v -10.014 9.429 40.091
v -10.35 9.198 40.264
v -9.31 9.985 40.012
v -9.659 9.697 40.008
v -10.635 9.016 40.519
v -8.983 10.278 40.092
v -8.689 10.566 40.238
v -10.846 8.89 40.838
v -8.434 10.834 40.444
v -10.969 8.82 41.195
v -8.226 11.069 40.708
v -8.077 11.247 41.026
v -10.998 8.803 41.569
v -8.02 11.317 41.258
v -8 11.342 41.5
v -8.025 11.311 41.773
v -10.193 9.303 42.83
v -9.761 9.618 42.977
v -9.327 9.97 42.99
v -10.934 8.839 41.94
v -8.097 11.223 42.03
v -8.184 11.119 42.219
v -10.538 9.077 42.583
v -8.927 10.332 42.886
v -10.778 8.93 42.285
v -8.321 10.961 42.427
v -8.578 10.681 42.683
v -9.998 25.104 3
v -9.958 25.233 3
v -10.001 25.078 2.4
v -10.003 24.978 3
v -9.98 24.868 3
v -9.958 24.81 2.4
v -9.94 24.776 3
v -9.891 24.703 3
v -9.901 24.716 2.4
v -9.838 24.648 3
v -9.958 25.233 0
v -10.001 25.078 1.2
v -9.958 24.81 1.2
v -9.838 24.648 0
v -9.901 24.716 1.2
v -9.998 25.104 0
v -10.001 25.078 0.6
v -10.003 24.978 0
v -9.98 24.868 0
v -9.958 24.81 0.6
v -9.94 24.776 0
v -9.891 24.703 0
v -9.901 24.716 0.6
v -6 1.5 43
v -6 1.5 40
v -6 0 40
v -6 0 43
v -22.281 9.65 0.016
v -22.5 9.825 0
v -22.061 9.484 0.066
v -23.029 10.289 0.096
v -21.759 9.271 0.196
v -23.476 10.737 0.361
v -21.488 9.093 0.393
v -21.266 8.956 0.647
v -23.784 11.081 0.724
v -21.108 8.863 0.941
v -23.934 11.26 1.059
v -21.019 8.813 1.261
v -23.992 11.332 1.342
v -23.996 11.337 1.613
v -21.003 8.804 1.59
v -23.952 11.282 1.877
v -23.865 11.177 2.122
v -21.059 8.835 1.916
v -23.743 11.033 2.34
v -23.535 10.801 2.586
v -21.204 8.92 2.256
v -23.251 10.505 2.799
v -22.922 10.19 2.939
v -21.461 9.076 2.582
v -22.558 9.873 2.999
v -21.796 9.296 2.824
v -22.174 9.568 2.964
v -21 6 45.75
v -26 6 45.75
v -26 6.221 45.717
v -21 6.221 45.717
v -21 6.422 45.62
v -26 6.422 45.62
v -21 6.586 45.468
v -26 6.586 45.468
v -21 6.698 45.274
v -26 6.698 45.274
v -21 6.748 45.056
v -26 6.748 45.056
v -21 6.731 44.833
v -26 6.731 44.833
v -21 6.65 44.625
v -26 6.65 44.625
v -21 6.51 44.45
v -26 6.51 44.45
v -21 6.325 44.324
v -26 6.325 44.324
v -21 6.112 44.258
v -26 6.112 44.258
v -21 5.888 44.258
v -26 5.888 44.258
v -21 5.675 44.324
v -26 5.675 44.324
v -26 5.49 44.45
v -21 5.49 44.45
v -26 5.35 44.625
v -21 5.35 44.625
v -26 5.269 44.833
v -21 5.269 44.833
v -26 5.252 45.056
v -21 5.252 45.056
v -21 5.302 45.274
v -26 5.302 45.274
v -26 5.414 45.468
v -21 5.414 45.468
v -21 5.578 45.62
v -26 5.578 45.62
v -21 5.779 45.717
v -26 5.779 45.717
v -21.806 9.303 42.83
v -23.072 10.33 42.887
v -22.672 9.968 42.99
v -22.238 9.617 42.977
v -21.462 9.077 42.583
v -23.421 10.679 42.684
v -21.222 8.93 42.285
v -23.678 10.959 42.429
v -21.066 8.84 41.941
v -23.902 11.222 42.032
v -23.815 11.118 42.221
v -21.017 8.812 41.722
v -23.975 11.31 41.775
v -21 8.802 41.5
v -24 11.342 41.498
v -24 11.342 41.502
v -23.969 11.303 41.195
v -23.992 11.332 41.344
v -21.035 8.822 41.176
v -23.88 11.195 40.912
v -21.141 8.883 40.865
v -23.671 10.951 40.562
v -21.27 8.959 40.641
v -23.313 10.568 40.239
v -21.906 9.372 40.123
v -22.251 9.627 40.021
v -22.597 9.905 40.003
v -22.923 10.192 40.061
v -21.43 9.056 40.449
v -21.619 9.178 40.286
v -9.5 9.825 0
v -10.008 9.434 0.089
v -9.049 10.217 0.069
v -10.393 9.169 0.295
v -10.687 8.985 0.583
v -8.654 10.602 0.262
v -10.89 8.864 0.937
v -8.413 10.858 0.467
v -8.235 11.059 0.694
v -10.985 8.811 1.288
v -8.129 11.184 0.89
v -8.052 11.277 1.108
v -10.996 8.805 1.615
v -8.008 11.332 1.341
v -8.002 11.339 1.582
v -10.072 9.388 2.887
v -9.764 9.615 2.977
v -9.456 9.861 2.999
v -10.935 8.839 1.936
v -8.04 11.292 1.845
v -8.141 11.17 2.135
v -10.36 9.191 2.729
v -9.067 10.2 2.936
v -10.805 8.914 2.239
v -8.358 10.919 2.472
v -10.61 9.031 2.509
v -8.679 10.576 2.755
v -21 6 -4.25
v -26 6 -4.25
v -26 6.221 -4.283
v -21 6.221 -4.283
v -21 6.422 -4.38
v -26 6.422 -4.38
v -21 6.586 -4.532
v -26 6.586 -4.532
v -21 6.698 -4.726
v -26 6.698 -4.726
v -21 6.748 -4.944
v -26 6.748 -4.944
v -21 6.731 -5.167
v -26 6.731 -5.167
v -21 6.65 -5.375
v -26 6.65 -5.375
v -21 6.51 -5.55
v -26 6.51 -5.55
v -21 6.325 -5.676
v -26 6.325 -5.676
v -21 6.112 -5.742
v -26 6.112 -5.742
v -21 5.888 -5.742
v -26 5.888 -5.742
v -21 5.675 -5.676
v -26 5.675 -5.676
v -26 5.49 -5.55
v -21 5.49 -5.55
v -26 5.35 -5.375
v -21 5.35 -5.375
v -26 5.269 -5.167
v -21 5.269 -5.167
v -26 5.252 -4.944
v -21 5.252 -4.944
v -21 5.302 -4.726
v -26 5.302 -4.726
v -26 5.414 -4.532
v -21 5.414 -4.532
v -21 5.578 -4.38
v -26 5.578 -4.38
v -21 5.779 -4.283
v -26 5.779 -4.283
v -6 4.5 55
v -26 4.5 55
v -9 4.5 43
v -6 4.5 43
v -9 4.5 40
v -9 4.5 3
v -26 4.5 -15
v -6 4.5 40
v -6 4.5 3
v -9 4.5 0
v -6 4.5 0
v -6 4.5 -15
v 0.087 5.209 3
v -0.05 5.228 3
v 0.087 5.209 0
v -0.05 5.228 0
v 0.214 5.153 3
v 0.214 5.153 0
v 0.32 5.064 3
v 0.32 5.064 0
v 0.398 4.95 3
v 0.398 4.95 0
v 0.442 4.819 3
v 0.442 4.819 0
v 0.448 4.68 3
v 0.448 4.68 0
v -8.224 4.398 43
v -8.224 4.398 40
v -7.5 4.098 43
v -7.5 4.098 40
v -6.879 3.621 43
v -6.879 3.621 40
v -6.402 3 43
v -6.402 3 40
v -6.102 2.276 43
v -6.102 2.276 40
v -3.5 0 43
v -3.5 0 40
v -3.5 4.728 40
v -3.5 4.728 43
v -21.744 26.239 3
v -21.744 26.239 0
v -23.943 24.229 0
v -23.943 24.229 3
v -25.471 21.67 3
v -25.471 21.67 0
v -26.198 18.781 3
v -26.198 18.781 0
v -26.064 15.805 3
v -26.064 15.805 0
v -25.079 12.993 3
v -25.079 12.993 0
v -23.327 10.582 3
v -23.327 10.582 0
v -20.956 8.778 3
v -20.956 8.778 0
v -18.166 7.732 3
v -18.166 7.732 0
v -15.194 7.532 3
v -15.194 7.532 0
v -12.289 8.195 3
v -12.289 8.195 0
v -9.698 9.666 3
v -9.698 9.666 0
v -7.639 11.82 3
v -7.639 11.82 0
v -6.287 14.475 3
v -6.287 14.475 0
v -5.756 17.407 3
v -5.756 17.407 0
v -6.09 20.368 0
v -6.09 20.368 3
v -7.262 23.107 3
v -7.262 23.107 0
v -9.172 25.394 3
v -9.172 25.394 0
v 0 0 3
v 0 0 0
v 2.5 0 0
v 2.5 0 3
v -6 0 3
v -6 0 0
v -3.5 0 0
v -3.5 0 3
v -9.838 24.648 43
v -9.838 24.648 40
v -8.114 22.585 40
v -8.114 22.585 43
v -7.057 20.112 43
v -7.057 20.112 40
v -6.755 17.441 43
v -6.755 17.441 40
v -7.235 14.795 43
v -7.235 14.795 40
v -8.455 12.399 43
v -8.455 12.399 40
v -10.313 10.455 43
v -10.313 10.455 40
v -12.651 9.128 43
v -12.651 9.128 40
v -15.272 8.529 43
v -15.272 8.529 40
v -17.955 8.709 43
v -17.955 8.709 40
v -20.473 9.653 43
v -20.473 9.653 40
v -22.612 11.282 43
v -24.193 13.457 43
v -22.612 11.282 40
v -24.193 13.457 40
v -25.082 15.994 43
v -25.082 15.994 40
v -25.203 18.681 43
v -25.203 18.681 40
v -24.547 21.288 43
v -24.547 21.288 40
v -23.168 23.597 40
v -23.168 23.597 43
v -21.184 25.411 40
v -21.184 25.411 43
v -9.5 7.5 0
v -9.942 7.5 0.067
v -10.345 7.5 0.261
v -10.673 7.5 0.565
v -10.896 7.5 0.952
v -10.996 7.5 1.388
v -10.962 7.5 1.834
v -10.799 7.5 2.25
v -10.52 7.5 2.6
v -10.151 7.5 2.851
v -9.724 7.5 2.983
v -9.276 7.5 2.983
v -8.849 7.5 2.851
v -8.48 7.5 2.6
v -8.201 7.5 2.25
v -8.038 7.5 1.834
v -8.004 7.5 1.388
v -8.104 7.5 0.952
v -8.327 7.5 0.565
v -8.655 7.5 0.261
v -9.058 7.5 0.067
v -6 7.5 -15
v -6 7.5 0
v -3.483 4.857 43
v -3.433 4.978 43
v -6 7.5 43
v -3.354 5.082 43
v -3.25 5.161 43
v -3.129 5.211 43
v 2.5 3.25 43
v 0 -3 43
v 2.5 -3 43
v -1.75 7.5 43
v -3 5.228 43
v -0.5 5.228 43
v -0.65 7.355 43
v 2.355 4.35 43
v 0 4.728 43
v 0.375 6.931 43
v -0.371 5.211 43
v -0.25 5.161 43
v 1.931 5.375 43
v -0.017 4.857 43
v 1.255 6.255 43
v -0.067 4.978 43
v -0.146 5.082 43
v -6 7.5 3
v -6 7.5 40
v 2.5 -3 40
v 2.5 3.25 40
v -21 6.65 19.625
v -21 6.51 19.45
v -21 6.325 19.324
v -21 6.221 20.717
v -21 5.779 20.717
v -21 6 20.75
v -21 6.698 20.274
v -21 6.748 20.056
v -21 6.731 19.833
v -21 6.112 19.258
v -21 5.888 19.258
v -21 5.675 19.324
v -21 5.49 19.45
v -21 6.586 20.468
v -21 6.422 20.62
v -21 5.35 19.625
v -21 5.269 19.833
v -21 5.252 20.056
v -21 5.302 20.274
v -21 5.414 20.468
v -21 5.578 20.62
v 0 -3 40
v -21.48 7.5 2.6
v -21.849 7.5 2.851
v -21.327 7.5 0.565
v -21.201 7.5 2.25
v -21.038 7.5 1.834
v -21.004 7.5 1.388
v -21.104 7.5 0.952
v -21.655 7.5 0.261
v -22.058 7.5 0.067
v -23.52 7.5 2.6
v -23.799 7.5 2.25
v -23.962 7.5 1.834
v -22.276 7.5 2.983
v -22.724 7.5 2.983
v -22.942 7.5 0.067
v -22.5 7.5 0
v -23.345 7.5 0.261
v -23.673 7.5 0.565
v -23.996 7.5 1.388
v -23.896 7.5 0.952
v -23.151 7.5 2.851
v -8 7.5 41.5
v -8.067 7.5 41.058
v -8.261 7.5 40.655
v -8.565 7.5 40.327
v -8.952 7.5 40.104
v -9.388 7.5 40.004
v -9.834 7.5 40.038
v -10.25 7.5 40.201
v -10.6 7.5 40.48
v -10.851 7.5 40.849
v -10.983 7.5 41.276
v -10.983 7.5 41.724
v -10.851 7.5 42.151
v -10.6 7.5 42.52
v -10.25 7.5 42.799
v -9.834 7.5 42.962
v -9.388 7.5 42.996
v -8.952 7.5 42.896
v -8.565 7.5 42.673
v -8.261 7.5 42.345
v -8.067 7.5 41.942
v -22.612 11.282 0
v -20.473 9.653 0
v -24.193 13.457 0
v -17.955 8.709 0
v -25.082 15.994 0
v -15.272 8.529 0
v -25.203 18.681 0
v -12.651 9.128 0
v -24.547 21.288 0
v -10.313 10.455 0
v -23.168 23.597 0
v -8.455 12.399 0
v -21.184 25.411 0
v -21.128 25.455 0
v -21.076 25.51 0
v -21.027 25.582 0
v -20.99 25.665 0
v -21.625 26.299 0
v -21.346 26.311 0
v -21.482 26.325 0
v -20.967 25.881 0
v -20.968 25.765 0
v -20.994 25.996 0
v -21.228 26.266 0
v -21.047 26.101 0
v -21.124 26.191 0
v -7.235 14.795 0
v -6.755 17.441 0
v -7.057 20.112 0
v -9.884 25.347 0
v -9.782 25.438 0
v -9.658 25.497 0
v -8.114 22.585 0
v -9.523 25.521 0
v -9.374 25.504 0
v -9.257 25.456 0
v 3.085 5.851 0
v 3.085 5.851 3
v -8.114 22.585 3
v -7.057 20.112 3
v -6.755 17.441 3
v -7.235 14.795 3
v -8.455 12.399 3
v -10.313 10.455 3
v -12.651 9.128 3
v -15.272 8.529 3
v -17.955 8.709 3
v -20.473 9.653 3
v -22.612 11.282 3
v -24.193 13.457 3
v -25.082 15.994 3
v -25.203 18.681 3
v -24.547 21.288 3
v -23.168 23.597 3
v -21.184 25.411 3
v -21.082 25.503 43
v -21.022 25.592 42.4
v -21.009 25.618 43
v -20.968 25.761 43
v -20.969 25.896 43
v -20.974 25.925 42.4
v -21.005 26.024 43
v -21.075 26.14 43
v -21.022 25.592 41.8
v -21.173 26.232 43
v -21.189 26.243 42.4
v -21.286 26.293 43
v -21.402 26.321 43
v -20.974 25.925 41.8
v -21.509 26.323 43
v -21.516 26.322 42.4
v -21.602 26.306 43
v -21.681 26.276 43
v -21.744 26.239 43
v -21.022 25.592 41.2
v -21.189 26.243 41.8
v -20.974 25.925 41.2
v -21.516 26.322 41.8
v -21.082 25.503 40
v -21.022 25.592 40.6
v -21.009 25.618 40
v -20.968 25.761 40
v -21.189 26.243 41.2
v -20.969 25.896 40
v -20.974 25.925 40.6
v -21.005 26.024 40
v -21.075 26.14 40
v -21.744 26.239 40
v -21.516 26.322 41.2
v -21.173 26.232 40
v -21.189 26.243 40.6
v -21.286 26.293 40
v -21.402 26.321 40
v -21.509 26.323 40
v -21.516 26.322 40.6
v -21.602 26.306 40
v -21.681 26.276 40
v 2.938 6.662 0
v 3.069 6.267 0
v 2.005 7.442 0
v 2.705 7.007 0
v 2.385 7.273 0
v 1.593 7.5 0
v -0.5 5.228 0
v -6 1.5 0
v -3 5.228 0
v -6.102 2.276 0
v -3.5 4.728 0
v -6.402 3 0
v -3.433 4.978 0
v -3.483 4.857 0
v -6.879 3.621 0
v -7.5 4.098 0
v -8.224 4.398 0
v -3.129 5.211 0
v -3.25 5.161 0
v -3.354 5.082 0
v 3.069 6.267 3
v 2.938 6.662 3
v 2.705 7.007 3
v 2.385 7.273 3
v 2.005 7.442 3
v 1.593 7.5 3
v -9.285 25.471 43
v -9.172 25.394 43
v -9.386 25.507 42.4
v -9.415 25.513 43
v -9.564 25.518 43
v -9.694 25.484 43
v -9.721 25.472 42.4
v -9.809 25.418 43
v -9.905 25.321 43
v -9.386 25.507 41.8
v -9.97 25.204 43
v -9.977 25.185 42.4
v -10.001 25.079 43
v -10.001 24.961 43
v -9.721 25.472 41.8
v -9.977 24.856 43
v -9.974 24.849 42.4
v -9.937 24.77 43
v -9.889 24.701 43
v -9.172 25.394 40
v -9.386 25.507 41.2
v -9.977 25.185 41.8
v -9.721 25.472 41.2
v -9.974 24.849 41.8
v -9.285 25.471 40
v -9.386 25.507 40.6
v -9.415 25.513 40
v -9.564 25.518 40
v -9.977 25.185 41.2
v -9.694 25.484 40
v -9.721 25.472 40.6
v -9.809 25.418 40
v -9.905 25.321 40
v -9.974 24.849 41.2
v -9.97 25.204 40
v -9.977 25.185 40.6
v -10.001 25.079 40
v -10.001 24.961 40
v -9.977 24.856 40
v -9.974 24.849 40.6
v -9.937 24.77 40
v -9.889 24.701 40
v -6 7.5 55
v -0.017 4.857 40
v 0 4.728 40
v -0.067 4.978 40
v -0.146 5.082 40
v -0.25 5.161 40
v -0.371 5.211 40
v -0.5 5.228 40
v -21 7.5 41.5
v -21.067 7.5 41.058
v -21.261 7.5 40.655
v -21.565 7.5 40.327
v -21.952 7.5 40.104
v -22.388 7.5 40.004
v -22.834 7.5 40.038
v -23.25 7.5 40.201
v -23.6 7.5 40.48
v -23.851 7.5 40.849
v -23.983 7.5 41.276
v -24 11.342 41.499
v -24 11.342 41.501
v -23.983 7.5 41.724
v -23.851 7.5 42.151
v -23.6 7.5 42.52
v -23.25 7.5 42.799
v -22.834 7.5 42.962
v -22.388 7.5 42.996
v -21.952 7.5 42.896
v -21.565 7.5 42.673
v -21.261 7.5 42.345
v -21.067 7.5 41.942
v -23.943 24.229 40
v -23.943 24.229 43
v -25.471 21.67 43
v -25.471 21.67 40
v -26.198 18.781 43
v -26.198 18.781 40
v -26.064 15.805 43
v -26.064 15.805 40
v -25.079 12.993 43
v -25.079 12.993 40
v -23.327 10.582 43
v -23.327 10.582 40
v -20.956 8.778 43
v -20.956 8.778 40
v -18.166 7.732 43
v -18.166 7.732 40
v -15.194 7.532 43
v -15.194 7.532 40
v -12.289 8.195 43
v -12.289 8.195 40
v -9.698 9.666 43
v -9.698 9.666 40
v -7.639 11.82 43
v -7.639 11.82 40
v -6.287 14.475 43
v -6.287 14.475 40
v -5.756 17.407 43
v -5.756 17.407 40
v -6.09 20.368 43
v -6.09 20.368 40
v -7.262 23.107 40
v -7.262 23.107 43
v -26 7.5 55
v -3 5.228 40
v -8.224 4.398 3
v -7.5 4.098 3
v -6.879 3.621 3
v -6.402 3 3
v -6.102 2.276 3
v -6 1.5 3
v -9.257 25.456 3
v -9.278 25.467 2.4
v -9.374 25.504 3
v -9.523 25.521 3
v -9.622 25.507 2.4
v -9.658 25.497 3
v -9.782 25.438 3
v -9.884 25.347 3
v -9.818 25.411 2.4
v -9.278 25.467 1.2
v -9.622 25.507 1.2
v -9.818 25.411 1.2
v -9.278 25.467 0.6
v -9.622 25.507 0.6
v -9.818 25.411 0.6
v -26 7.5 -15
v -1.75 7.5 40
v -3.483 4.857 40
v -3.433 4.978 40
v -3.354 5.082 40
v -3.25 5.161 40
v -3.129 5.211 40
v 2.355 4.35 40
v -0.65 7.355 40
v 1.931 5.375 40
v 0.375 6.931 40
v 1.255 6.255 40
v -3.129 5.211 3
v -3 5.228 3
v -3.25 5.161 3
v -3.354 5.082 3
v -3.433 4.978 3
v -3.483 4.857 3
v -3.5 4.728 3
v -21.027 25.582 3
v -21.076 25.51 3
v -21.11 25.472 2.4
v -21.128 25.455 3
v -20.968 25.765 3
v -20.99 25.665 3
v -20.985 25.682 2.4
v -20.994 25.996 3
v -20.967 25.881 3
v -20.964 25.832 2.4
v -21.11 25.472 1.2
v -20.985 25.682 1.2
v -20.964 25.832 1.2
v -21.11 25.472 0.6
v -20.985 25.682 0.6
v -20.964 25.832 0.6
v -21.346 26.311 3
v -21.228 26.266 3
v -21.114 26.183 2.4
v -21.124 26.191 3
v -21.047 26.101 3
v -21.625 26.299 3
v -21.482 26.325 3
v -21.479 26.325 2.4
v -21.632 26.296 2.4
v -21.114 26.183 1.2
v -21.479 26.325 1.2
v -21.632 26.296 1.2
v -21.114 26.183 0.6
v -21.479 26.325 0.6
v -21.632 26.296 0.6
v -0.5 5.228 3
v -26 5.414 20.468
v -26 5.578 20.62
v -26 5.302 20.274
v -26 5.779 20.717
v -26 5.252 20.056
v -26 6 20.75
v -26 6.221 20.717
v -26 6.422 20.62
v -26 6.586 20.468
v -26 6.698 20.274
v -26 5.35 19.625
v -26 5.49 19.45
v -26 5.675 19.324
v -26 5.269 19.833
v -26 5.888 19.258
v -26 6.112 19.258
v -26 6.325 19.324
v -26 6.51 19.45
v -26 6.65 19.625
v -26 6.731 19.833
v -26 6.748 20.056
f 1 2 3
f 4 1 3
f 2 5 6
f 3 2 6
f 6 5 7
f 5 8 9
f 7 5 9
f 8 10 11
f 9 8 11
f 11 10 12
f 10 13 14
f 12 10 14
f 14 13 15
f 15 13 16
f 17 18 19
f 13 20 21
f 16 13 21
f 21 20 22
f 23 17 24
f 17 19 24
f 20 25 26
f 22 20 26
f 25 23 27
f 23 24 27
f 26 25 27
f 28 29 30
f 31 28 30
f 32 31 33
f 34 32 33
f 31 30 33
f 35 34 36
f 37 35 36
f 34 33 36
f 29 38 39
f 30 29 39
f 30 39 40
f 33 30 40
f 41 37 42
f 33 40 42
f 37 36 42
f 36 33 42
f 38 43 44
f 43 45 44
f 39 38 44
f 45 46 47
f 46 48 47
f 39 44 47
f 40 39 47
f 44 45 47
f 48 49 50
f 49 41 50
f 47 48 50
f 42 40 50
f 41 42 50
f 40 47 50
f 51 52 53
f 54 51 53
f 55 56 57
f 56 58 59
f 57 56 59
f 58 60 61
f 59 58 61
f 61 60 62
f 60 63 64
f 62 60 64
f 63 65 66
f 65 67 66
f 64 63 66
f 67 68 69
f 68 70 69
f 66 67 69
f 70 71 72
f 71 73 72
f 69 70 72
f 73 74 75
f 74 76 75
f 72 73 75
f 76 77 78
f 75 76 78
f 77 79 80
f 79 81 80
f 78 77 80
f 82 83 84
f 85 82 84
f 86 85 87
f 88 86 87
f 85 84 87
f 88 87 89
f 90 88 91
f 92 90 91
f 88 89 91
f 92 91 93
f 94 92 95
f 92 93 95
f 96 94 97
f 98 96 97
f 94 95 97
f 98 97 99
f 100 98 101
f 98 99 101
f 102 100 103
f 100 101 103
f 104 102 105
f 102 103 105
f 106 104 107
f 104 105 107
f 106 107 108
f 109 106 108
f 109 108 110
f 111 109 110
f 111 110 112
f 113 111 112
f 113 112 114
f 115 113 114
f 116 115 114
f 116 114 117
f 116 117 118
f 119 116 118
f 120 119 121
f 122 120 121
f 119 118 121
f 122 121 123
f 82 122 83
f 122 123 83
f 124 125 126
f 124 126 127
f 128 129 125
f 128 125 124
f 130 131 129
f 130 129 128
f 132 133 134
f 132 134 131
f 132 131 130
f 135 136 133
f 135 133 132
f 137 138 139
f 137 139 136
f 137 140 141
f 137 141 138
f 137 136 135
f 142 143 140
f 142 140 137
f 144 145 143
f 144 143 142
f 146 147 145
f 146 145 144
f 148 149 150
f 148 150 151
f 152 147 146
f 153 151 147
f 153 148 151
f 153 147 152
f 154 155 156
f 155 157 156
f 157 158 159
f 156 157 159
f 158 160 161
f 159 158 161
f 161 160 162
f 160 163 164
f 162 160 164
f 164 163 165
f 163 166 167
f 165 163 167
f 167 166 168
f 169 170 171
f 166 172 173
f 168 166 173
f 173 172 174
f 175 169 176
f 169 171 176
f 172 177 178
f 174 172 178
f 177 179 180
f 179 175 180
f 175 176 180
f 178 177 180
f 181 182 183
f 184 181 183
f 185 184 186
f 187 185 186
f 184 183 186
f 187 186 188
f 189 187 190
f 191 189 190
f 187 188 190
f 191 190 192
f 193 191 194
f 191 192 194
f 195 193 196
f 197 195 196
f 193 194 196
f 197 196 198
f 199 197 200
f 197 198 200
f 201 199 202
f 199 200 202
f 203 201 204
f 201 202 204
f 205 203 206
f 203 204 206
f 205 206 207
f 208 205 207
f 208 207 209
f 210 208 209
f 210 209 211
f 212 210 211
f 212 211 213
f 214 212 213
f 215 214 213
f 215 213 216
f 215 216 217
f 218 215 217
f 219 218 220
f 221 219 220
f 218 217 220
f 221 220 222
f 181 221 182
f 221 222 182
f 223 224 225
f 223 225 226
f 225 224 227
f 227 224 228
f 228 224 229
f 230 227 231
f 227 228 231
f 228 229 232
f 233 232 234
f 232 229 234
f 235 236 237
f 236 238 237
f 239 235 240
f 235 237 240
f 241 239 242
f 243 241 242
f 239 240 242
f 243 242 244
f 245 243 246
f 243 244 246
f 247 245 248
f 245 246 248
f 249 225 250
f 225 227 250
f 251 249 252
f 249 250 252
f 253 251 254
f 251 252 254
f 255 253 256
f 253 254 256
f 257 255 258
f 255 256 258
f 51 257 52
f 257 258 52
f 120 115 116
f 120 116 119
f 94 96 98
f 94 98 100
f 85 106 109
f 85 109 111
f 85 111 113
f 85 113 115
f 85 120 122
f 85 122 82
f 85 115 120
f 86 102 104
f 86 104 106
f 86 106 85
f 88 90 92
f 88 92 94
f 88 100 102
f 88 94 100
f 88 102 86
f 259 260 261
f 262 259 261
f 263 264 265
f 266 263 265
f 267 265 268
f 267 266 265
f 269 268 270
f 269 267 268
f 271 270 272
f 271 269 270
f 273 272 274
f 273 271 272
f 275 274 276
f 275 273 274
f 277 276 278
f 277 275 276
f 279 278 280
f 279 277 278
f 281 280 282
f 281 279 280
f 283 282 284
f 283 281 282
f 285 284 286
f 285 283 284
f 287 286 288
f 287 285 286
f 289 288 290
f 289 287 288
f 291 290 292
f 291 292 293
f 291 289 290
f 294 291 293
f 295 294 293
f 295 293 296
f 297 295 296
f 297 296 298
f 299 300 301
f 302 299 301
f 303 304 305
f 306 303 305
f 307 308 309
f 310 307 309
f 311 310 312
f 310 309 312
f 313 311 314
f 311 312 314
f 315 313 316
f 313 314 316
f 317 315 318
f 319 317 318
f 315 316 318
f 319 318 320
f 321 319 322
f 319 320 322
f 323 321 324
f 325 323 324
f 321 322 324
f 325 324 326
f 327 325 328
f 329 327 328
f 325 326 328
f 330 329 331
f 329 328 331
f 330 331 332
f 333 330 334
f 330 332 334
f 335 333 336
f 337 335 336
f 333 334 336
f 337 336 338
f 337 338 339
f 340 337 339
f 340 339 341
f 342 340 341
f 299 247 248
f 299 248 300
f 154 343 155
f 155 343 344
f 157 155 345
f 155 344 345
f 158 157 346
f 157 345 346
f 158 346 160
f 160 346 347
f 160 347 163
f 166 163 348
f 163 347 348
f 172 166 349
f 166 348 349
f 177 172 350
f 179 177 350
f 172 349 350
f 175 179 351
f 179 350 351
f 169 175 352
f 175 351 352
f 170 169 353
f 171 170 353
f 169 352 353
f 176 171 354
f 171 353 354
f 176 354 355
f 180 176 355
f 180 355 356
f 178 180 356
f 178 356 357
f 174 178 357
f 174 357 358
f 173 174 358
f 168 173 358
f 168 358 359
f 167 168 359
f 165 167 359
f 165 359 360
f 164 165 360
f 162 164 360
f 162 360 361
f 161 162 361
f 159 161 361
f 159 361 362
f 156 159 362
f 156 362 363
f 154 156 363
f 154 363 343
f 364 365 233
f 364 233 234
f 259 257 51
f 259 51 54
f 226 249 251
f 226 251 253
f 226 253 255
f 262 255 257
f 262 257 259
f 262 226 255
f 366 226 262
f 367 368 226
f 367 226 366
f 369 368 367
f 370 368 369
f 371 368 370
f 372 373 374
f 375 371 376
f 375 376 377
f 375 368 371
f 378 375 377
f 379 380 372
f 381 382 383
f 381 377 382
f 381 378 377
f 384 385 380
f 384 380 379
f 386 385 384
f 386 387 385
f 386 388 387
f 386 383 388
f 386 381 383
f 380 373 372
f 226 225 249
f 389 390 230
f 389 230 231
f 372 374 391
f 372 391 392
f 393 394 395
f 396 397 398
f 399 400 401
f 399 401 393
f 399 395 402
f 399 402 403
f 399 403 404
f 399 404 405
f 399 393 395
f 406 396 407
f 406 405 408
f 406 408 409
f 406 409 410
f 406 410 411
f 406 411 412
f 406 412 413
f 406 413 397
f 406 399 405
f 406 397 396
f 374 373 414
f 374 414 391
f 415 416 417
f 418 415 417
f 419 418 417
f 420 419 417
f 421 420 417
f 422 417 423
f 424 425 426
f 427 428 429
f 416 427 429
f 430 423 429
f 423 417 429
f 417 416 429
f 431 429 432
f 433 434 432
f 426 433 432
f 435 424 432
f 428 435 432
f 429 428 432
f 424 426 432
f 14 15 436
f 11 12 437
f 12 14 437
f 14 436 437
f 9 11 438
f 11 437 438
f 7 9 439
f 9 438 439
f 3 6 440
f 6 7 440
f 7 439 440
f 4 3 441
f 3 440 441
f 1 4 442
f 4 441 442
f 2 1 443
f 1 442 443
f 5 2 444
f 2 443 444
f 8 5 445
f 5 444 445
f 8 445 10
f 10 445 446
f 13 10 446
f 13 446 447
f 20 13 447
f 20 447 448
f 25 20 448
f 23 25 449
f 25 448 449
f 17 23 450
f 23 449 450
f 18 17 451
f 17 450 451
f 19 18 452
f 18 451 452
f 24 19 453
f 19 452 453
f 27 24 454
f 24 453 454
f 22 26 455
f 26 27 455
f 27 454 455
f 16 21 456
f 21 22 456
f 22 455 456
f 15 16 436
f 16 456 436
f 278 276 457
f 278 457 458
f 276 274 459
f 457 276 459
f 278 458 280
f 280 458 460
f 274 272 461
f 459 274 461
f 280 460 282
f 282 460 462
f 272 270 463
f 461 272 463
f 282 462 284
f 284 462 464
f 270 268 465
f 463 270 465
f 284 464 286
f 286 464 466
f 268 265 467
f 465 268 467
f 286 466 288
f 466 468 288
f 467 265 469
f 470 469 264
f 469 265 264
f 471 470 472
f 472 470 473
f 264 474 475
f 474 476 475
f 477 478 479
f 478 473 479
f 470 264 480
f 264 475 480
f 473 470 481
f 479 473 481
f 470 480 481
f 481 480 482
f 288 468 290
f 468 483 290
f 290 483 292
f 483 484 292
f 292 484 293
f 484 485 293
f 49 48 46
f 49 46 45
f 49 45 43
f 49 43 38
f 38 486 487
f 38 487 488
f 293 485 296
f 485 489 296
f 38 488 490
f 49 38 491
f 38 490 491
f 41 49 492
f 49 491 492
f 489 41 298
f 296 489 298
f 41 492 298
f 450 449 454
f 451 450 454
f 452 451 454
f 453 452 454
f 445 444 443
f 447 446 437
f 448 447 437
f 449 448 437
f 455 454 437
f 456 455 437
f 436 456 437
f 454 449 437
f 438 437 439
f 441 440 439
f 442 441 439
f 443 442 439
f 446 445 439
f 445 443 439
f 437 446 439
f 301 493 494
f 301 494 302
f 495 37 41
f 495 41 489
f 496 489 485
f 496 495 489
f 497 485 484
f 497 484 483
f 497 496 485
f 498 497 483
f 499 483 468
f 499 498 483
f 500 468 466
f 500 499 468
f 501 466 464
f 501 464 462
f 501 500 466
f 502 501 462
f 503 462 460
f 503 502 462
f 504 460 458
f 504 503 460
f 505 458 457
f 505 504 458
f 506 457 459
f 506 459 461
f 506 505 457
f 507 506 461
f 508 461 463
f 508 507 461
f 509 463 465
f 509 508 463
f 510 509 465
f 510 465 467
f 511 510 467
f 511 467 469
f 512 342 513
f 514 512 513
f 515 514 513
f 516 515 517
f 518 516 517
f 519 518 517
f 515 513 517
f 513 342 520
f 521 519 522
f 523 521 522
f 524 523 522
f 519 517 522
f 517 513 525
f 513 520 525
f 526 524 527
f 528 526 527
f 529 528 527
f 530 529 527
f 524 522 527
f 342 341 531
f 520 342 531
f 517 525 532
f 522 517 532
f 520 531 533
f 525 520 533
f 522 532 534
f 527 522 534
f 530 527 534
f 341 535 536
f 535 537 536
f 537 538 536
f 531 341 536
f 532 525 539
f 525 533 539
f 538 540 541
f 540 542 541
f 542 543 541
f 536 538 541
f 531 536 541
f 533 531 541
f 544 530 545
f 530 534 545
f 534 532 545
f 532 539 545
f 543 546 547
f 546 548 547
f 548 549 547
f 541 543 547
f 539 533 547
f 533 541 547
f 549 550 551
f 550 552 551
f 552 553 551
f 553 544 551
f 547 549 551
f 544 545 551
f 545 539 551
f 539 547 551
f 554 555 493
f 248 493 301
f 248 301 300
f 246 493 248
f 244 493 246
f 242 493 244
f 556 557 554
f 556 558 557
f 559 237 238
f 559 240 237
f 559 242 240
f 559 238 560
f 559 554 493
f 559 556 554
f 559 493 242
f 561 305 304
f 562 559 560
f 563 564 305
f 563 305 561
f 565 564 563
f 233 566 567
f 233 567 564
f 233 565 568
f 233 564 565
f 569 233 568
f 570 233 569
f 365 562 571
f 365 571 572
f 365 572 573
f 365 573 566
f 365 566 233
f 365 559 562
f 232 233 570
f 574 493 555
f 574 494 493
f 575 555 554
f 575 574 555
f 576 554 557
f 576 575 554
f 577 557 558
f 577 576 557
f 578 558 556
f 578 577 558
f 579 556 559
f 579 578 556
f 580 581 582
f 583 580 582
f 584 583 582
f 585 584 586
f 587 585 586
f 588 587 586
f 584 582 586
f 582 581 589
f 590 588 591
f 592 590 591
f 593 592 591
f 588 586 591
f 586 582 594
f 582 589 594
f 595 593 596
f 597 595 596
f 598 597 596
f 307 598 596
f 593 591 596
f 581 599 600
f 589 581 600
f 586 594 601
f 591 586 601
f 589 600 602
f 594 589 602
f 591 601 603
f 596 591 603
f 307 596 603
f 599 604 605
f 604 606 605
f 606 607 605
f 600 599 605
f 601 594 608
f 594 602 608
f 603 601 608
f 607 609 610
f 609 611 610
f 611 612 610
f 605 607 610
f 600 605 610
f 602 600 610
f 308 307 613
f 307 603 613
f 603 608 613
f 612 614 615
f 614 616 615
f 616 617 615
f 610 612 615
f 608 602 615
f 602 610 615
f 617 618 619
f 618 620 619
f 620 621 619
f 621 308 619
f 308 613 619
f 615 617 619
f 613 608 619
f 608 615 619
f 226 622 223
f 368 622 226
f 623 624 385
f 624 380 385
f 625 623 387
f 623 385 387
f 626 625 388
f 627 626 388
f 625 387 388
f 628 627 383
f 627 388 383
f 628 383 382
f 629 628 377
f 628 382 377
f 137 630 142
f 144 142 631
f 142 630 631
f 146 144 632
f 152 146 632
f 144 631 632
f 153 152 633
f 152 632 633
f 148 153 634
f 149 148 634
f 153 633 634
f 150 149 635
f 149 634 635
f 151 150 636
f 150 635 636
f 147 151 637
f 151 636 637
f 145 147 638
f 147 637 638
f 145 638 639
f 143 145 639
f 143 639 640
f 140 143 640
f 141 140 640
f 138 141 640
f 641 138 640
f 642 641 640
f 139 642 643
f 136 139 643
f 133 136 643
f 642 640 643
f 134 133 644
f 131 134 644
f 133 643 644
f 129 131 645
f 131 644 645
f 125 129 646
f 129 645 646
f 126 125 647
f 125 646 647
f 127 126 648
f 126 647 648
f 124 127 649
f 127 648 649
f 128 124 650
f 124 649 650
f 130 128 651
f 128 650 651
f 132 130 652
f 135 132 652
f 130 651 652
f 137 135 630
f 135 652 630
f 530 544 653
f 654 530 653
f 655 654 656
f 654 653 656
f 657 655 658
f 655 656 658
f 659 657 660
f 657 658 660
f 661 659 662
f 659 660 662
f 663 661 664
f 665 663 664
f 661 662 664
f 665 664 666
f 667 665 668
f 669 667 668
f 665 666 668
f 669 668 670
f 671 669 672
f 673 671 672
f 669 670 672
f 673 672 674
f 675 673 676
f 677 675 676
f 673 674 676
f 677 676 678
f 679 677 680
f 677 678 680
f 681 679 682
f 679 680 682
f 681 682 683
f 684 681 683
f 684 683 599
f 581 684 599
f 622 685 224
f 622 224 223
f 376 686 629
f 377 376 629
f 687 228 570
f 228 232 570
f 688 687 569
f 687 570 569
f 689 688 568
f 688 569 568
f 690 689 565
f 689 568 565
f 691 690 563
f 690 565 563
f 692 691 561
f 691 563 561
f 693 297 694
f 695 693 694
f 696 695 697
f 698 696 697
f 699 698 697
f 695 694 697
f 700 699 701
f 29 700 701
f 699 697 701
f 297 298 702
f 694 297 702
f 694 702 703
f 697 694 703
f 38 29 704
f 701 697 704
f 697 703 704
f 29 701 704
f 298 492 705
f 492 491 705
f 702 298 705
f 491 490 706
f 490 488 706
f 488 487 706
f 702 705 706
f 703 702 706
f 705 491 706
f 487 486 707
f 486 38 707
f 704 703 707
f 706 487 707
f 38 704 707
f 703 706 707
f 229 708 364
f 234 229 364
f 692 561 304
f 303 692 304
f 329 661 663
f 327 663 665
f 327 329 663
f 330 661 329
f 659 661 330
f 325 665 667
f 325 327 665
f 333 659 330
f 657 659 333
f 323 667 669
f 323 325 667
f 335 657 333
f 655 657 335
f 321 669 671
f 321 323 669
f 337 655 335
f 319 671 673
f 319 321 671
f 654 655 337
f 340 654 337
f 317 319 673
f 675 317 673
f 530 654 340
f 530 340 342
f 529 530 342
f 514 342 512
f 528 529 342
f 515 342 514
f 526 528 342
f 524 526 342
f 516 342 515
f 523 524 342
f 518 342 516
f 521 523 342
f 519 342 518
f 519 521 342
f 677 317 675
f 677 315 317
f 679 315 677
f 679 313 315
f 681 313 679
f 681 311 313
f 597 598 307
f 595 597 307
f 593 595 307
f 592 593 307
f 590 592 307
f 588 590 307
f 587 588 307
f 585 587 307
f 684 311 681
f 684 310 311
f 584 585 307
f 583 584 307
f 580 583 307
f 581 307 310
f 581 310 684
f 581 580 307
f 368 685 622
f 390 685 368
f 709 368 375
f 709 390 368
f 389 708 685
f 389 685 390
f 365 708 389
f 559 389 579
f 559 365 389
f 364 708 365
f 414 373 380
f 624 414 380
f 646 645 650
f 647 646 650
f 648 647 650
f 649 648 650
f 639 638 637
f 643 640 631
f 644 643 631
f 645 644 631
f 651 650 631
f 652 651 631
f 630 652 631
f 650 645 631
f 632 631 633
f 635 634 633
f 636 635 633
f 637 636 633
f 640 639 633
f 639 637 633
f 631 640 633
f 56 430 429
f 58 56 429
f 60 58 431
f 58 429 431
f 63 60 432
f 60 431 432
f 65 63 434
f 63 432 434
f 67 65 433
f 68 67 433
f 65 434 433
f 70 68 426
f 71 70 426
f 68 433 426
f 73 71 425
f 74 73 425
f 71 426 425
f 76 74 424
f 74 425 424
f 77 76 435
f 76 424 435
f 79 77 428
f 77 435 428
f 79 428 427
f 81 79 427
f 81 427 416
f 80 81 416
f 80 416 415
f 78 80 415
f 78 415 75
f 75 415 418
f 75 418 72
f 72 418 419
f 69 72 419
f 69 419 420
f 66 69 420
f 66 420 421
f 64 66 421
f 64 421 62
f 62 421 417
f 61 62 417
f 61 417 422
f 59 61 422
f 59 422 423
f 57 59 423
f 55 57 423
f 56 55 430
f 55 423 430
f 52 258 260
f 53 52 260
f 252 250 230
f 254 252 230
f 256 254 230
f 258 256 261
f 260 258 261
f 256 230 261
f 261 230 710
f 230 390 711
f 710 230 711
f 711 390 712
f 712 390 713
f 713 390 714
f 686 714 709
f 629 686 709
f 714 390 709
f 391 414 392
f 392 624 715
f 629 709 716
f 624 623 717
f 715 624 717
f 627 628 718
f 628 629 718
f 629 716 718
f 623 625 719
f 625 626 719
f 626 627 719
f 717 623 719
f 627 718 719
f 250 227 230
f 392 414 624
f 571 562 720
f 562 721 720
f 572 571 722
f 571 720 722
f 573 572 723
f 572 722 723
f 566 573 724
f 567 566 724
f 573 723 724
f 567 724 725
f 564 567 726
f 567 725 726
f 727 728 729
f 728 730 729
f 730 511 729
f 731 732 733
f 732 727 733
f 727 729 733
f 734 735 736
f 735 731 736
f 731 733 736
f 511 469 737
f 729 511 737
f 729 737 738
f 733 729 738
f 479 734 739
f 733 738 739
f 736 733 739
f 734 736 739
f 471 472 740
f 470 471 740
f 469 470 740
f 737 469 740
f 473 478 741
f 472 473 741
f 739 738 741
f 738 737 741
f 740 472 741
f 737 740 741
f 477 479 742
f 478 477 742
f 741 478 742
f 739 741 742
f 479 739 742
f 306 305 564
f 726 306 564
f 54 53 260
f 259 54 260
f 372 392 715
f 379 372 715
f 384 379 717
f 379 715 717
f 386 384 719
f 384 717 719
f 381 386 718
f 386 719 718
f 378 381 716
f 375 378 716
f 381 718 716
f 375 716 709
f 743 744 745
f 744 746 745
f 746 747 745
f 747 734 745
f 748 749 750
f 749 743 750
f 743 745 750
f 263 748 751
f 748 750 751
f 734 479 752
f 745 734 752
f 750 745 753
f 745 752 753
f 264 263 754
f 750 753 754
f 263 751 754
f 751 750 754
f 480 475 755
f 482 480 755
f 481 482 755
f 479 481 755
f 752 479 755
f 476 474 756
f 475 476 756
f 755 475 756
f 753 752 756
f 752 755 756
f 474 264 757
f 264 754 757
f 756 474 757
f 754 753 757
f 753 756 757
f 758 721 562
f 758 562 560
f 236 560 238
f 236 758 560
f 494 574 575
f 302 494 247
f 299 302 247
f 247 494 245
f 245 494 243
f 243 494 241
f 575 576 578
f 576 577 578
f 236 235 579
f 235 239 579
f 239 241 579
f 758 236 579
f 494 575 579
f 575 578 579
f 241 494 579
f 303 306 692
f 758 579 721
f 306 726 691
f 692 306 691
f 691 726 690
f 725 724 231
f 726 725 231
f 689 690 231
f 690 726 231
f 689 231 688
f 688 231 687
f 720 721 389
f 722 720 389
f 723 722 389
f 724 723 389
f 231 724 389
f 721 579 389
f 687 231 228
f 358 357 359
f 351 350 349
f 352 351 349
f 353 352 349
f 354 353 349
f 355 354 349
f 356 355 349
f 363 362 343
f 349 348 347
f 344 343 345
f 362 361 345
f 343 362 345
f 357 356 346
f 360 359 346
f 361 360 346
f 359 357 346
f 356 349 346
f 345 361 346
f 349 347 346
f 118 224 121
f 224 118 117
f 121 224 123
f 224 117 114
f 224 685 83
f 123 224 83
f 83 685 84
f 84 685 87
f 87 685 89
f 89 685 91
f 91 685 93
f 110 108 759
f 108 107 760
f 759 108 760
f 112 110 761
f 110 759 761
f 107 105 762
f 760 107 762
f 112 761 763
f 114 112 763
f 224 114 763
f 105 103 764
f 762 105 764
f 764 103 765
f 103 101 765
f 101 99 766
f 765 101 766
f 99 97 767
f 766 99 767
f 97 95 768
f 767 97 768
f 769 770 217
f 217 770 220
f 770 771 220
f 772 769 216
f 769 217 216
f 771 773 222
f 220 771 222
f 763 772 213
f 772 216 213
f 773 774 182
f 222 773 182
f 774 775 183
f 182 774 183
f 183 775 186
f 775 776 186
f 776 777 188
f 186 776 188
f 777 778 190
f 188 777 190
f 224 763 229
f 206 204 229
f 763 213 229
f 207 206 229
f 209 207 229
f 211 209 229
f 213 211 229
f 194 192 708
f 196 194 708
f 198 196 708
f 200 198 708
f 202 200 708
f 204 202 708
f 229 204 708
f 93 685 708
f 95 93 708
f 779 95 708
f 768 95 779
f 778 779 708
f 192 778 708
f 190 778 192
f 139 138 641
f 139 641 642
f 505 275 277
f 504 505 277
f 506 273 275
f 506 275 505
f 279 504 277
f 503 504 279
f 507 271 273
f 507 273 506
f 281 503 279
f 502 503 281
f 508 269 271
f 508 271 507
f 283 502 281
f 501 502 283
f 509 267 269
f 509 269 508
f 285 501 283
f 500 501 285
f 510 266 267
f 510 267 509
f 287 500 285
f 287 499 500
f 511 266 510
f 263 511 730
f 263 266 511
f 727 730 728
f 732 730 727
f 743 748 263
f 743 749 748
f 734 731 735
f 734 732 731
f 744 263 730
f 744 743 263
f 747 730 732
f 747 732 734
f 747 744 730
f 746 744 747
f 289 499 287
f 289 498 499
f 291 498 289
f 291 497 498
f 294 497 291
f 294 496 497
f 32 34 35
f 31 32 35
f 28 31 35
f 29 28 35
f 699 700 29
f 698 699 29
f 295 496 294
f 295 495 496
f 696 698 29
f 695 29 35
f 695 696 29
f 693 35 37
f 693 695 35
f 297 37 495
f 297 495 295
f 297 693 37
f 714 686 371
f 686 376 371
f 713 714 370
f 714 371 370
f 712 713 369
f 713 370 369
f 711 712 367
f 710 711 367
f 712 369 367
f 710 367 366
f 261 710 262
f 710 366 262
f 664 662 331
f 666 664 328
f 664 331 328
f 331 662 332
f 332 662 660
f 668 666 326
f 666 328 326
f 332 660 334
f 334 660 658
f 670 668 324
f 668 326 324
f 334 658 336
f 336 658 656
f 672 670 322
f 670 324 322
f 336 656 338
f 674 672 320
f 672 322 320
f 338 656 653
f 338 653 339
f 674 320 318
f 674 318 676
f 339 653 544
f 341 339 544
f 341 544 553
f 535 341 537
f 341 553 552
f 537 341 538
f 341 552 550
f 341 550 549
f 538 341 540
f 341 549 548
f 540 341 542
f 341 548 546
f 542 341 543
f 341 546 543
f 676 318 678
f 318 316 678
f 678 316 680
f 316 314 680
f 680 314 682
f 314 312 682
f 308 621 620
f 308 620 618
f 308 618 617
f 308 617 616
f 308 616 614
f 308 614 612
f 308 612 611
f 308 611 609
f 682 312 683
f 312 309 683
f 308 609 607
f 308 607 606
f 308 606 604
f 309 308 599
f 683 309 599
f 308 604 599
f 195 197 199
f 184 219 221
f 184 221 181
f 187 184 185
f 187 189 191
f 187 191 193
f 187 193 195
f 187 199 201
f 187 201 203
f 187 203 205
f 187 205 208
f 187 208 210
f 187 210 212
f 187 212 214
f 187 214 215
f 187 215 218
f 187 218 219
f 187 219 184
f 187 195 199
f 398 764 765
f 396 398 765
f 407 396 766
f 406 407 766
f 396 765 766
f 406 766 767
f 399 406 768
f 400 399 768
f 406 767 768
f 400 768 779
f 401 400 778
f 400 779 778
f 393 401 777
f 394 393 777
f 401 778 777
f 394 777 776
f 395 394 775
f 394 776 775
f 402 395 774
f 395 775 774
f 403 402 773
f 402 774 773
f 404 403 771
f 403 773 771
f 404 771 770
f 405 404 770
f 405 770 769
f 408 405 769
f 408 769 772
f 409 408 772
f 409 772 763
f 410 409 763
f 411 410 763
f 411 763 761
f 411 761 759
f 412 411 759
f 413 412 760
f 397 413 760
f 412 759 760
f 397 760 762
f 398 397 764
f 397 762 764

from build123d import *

# Parameters (mm, degrees)
BOSS_EXTRUDE1_DEPTH      = 3
LPATTERN1_COUNT          = 2
LPATTERN1_PITCH          = 40
SKETCH2_W                = 20
SKETCH2_H                = 70
BOSS_EXTRUDE2_DEPTH      = 3
FILLET1_R                = 3
BOSS_EXTRUDE3_DEPTH      = 3
FILLET2_START            = -1
FILLET2_DEPTH            = 5
FILLET3_DEPTH            = 3
BOSS_EXTRUDE5_REACH      = 65.784
BOSS_EXTRUDE5_END_RADIUS = 10.25
SKETCH5_R                = 1.5
LPATTERN2_START          = 40
LPATTERN2_DEPTH          = 3
LPATTERN2_START_2        = 7.5
LPATTERN2_2_OUTLINE_R    = 1.5
LPATTERN2_2_DEPTH        = 1.302234895
LPATTERN2_START_3        = 8.802234895
LPATTERN2_3_OUTLINE_R    = 1.5
LPATTERN2_3_DEPTH        = 2.539759791
LPATTERN2_START_4        = 39
LPATTERN2_4_DEPTH        = 5
LPATTERN2_5_OUTLINE_R    = 1.5
LPATTERN2_5_DEPTH        = 1.302235223
LPATTERN2_START_5        = 8.802235223
LPATTERN2_6_OUTLINE_R    = 1.5
LPATTERN2_6_DEPTH        = 2.539761855
LPATTERN2_7_OUTLINE_W    = 10.25
LPATTERN2_7_OUTLINE_H    = 3.000220265
LPATTERN2_7_ANGLE        = 22.115218
CUT_EXTRUDE2_DEPTH       = 64.922422006
CUT_EXTRUDE2_DEPTH_BACK  = 64.922422006
SKETCH6_W                = 3.5
SKETCH6_H                = 1.978060381
FILLET4_R                = 0.5
SKETCH7_W                = 2.5
SKETCH7_H                = 3
BOSS_EXTRUDE6_DEPTH      = 3
SKETCH8_R                = 0.75
CUT_EXTRUDE3_DEPTH       = 5
CUT_EXTRUDE4_START       = -3
CUT_EXTRUDE4_DEPTH       = 3
BOSS_EXTRUDE7_DEPTH      = 3
FILLET5_R                = 0.5
FILLET6_R                = 1.5


with BuildPart() as part:
    # Sketch1 → Boss-Extrude1 (new body)
    with BuildSketch(Plane.XY):
        with BuildLine():
            Line((0, 3.25), (0, 0))
            Line((0, 0), (2.5, 0))
            Line((2.5, 0), (2.5, 3.25))
            ThreePointArc((2.5, 3.25), (1.25520382, 6.25520382), (-1.75, 7.5))
            Line((-1.75, 7.5), (-6, 7.5))
            Line((-6, 7.5), (-6, 3.25))
            Line((-6, 3.25), (-6, 0))
            Line((-6, 0), (-3.5, 0))
            Line((-3.5, 0), (-3.5, 3.25))
            ThreePointArc((-3.5, 3.25), (-1.75, 5), (0, 3.25))
        make_face()
    extrude(amount=BOSS_EXTRUDE1_DEPTH)


with BuildPart() as lpattern1_1:
    # LPattern1: pattern copy
    add(part.part.moved(Location(Vector(0, 0, 1) * (1 * LPATTERN1_PITCH))))


with BuildPart() as part_1:
    add(part.part)

    add(lpattern1_1.part)  # Boss-Extrude2 merges LPattern1_1
    # Sketch2 → Boss-Extrude2 (add)
    with BuildSketch(Plane(origin=(0, 7.5, 0), x_dir=(1, 0, 0), z_dir=(0, 1, 0))):
        with Locations((-16, -20)):
            Rectangle(SKETCH2_W, SKETCH2_H)
    extrude(amount=-BOSS_EXTRUDE2_DEPTH)

    # Fillet1
    fillet1_edges = [part_1.edges().sort_by_distance(p)[0] for p in [
        (-6, 4.5, 1.5),
        (-6, 4.5, 41.5),
    ]]
    fillet(fillet1_edges, radius=FILLET1_R)

    # Sketch6 → Cut-Extrude2 (cut, two sides: drawn at the far end of the back side and taken through both)
    with BuildSketch(Plane.XY.offset(3).offset(-CUT_EXTRUDE2_DEPTH_BACK)):
        with Locations((-1.75, 4.239030191)):
            Rectangle(SKETCH6_W, SKETCH6_H)
    extrude(amount=CUT_EXTRUDE2_DEPTH + CUT_EXTRUDE2_DEPTH_BACK, mode=Mode.SUBTRACT)

    # Fillet4
    fillet4_edges = [part_1.edges().sort_by_distance(p)[0] for p in [
        (-3.5, 5.228060381, 1.5),
        (-3.5, 5.228060381, 41.5),
        (0, 5.228060381, 1.5),
        (0, 5.228060381, 41.5),
    ]]
    fillet(fillet4_edges, radius=FILLET4_R)

    # Sketch7 → Boss-Extrude6 (add)
    with BuildSketch(Plane.XY.offset(43)):
        with Locations((1.25, -1.5)):
            Rectangle(SKETCH7_W, SKETCH7_H)
    extrude(amount=-BOSS_EXTRUDE6_DEPTH)

    # Sketch8 → Cut-Extrude3 (cut)
    with BuildSketch(Plane.ZY.offset(26)):
        with Locations((-5, 6)):
            Circle(SKETCH8_R)
        with Locations((20, 6)):
            Circle(SKETCH8_R)
        with Locations((45, 6)):
            Circle(SKETCH8_R)
    extrude(amount=-CUT_EXTRUDE3_DEPTH, mode=Mode.SUBTRACT)

    # Sketch9 → Cut-Extrude4 (cut)
    with BuildSketch(Plane(origin=(0, 0, 0), x_dir=(-1, 0, 0), z_dir=(0, 0, -1)).offset(CUT_EXTRUDE4_START)):
        with BuildLine():
            Line((0, 0), (0.5, 5.228060381))
            ThreePointArc((0.5, 5.228060381), (0.146446609, 5.081613772), (0, 4.728060381))
            Line((0, 4.728060381), (0, 0))
        make_face()
        with BuildLine():
            Line((0.5, 5.228060381), (-0.5, 5.228060381))
            Line((-0.5, 5.228060381), (0, 0))
            Line((0, 0), (0, 4.728060381))
            ThreePointArc((0, 4.728060381), (0.146446609, 5.081613772), (0.5, 5.228060381))
        make_face()
    extrude(amount=CUT_EXTRUDE4_DEPTH, mode=Mode.SUBTRACT)

    # Sketch9<3> → Boss-Extrude7 (add)
    with BuildSketch(Plane(origin=(0, 0, 0), x_dir=(-1, 0, 0), z_dir=(0, 0, -1))):
        with BuildLine():
            Line((1.75, 7.5), (-3.25, 7.5))
            Line((-3.25, 7.5), (-2.5, 0))
            Line((-2.5, 0), (-2.5, 3.25))
            ThreePointArc((-2.5, 3.25), (-1.25520382, 6.25520382), (1.75, 7.5))
        make_face()
    extrude(amount=-BOSS_EXTRUDE7_DEPTH)

    # Fillet5
    fillet5_edges = [part_1.edges().sort_by_distance(p)[0] for p in [
        (0.5, 5.228060381, 1.5),
    ]]
    fillet(fillet5_edges, radius=FILLET5_R)

    # Fillet6
    fillet6_edges = [part_1.edges().sort_by_distance(p)[0] for p in [
        (3.25, 7.5, 1.5),
    ]]
    fillet(fillet6_edges, radius=FILLET6_R)


with BuildPart() as body_2:
    # Sketch4 → Boss-Extrude3 (new body)
    with BuildSketch(Plane.XY.offset(3)):
        with BuildLine():
            Line((-20.857798696, 25.621740076), (-21.206324936, 26.579308051))
            ThreePointArc((-21.206324936, 26.579308051), (-16.672163531, 7.522062955), (-9.682947675, 25.822010278))
            Line((-9.682947675, 25.822010278), (-10.11803023, 24.888972729))
            ThreePointArc((-10.11803023, 24.888972729), (-16.629657521, 8.521455618), (-20.857798696, 25.621740076))
        make_face()
    extrude(amount=-BOSS_EXTRUDE3_DEPTH)

    # Fillet2: read off the stored shape, not the designer's step
    # Fillet2 outline → Fillet2 (cut)
    with BuildSketch(Plane.XY.offset(FILLET2_START)):
        with BuildLine():
            add(Edge.make_bspline(
                [(-20.994076432, 25.996160077), (-21.074153595, 26.216170321), (-21.251523965, 26.350710286), (-21.454646821, 26.373043505), (-21.624101617, 26.320471493), (-21.744123922, 26.239260296)],
                knots=[0.438237279, 0.438237279, 0.438237279, 0.438237279, 0.438237279, 0.438237279, 1, 1, 1, 1, 1, 1], degree=5, weights=[0.507629267, 0.479872472, 0.515231147, 0.613705294, 0.775294911, 1]))
            Line((-20.994076432, 25.996160077), (-21.206324936, 26.579308051))
            ThreePointArc((-21.206324936, 26.579308051), (-21.477863695, 26.413458278), (-21.744123922, 26.239260296))
        make_face()
        with BuildLine():
            add(Edge.make_bspline(
                [(-21.183721588, 25.411039779), (-21.095700521, 25.470597844), (-21.011417818, 25.561339411), (-20.949957611, 25.687250869), (-20.937439038, 25.840550084), (-20.994076432, 25.996160077)],
                knots=[0, 0, 0, 0, 0, 0, 0.438237279, 0.438237279, 0.438237279, 0.438237279, 0.438237279, 0.438237279], degree=5, weights=[1, 0.824705088, 0.687820559, 0.589346413, 0.529282649, 0.507629267]))
            ThreePointArc((-21.183721588, 25.411039779), (-21.021865296, 25.518099442), (-20.857798696, 25.621740076))
            Line((-20.857798696, 25.621740076), (-20.994076432, 25.996160077))
        make_face()
    extrude(amount=FILLET2_DEPTH, mode=Mode.SUBTRACT)

    # Fillet3: read off the stored shape, not the designer's step
    # Fillet3 outline → Fillet3 (cut)
    with BuildSketch(Plane.XY):
        with BuildLine():
            add(Edge.make_bspline(
                [(-9.171518011, 25.394235327), (-9.282578146, 25.493443697), (-9.44922289, 25.569577268), (-9.660410728, 25.570842005), (-9.856114015, 25.450653826), (-9.957768573, 25.23265496)],
                knots=[0, 0, 0, 0, 0, 0, 0.573717386, 0.573717386, 0.573717386, 0.573717386, 0.573717386, 0.573717386], degree=5, weights=[1, 0.770513046, 0.606856419, 0.50903012, 0.477034149, 0.510868506]))
            ThreePointArc((-9.171518011, 25.394235327), (-9.423753658, 25.612282369), (-9.682947675, 25.822010278))
            Line((-9.682947675, 25.822010278), (-9.957768573, 25.23265496))
        make_face()
        with BuildLine():
            add(Edge.make_bspline(
                [(-9.957768573, 25.23265496), (-10.024989519, 25.088499201), (-10.028130695, 24.940896848), (-9.983698166, 24.813907164), (-9.914364214, 24.716929113), (-9.837711376, 24.648456271)],
                knots=[0.573717386, 0.573717386, 0.573717386, 0.573717386, 0.573717386, 0.573717386, 1, 1, 1, 1, 1, 1], degree=5, weights=[0.510868506, 0.536008058, 0.597490983, 0.695317282, 0.829486954, 1]))
            Line((-9.957768573, 25.23265496), (-10.11803023, 24.888972729))
            ThreePointArc((-10.11803023, 24.888972729), (-9.976670181, 24.770113809), (-9.837711376, 24.648456271))
        make_face()
    extrude(amount=FILLET3_DEPTH, mode=Mode.SUBTRACT)


with BuildPart() as body_3:
    # Boss-Extrude5: up to this cylinder (the profile starts outside it)
    boss_extrude5_end = Plane(origin=(-16, 17.75, 1.5), z_dir=(0, 0, 1)) * Cylinder(BOSS_EXTRUDE5_END_RADIUS, 153.068, mode=Mode.PRIVATE)
    # Sketch5 → Boss-Extrude5 (new, up to the surface)
    with BuildSketch(Plane(origin=(0, 7.5, 0), x_dir=(1, 0, 0), z_dir=(0, 1, 0)), mode=Mode.PRIVATE) as boss_extrude5_sk1:
        with Locations(Location((-22.5, -1.5, 0), (0, 0, 90))):
            Circle(SKETCH5_R)
    boss_extrude5_tool1 = extrude(boss_extrude5_sk1.sketch, amount=BOSS_EXTRUDE5_REACH, mode=Mode.PRIVATE) - boss_extrude5_end
    add(boss_extrude5_tool1.solids().sort_by_distance((-22.5, 7.5, 1.5))[0])
    # Sketch5 → Boss-Extrude5 (new, up to the surface)
    with BuildSketch(Plane(origin=(0, 7.5, 0), x_dir=(1, 0, 0), z_dir=(0, 1, 0)), mode=Mode.PRIVATE) as boss_extrude5_sk2:
        with Locations(Location((-9.5, -1.5, 0), (0, 0, 90))):
            Circle(SKETCH5_R)
    boss_extrude5_tool2 = extrude(boss_extrude5_sk2.sketch, amount=BOSS_EXTRUDE5_REACH, mode=Mode.PRIVATE) - boss_extrude5_end
    add(boss_extrude5_tool2.solids().sort_by_distance((-9.5, 7.5, 1.5))[0])


with BuildPart() as body_4:
    # LPattern2: read off the stored shape, not the designer's step
    # LPattern2 outline → LPattern2 (new body)
    with BuildSketch(Plane.XY.offset(LPATTERN2_START)):
        with BuildLine():
            ThreePointArc((-21.744123922, 26.239260296), (-16.687368099, 7.523073526), (-9.171518011, 25.394235327))
            add(Edge.make_bspline(
                [(-9.171518011, 25.394235327), (-9.42011103, 25.616299782), (-9.897400645, 25.707435586), (-10.230497327, 25.334546058), (-10.086304395, 24.870520725), (-9.837711376, 24.648456271)],
                knots=[0, 0, 0, 0, 0, 0, 1, 1, 1, 1, 1, 1], degree=5, weights=[1, 0.6, 0.4, 0.4, 0.6, 1]))
            ThreePointArc((-9.837711376, 24.648456271), (-16.620307797, 8.520822451), (-21.183721588, 25.41103978))
            add(Edge.make_bspline(
                [(-21.183721588, 25.41103978), (-20.907648082, 25.597840557), (-20.702656783, 26.038396659), (-20.98285795, 26.452506918), (-21.468050416, 26.426061074), (-21.744123922, 26.239260296)],
                knots=[0, 0, 0, 0, 0, 0, 1, 1, 1, 1, 1, 1], degree=5, weights=[1, 0.6, 0.4, 0.4, 0.6, 1]))
        make_face()
    extrude(amount=LPATTERN2_DEPTH)


with BuildPart() as body_5:
    # LPattern2 2 outline → LPattern2 2 (new body)
    with BuildSketch(Plane(origin=(0, 0, 0), x_dir=(1, 0, 0), z_dir=(0, 1, 0)).offset(LPATTERN2_START_2)):
        with Locations((-22.5, -41.5)):
            Circle(LPATTERN2_2_OUTLINE_R)
    extrude(amount=LPATTERN2_2_DEPTH)

    # LPattern2 3 outline → LPattern2 3 (add)
    with BuildSketch(Plane(origin=(0, 0, 0), x_dir=(1, 0, 0), z_dir=(0, 1, 0)).offset(LPATTERN2_START_3)):
        with Locations((-22.5, -41.5)):
            Circle(LPATTERN2_3_OUTLINE_R)
    extrude(amount=LPATTERN2_3_DEPTH)

    # LPattern2 4 outline → LPattern2 4 (cut)
    with BuildSketch(Plane.XY.offset(LPATTERN2_START_4)):
        with BuildLine():
            Line((-20, 11.341994686), (-23.999998778, 11.341995665))
            ThreePointArc((-23.999998778, 11.341995665), (-22.622702211, 9.926809128), (-20.999584885, 8.802002963))
            Line((-20.999584885, 8.802002963), (-20, 8.243497024))
            Line((-20, 8.243497024), (-20, 11.341994686))
        make_face()
    extrude(amount=LPATTERN2_4_DEPTH, mode=Mode.SUBTRACT)


with BuildPart() as body_6:
    # LPattern2 5 outline → LPattern2 5 (new body)
    with BuildSketch(Plane(origin=(0, 0, 0), x_dir=(1, 0, 0), z_dir=(0, 1, 0)).offset(LPATTERN2_START_2)):
        with Locations((-9.5, -41.5)):
            Circle(LPATTERN2_5_OUTLINE_R)
    extrude(amount=LPATTERN2_5_DEPTH)

    # LPattern2 6 outline → LPattern2 6 (add)
    with BuildSketch(Plane(origin=(0, 0, 0), x_dir=(1, 0, 0), z_dir=(0, 1, 0)).offset(LPATTERN2_START_5)):
        with Locations((-9.5, -41.5)):
            Circle(LPATTERN2_6_OUTLINE_R)
    extrude(amount=LPATTERN2_6_DEPTH)

    # LPattern2 7 outline → LPattern2 7 (revolve, cut)
    with BuildSketch(Plane(origin=(-16, 17.75, 0), x_dir=(0.4877650283417417, -0.8729749579035929, 0), z_dir=(-0.8729749579035929, -0.4877650283417417, 0))):
        with Locations((5.125, 41.500109978)):
            Rectangle(LPATTERN2_7_OUTLINE_W, LPATTERN2_7_OUTLINE_H)
    revolve(axis=Axis((-16, 17.75, 0), (0, 0, 1)), revolution_arc=LPATTERN2_7_ANGLE, mode=Mode.SUBTRACT)


solid = Compound([part_1.part, body_2.part, body_3.part, body_4.part, body_5.part, body_6.part])
